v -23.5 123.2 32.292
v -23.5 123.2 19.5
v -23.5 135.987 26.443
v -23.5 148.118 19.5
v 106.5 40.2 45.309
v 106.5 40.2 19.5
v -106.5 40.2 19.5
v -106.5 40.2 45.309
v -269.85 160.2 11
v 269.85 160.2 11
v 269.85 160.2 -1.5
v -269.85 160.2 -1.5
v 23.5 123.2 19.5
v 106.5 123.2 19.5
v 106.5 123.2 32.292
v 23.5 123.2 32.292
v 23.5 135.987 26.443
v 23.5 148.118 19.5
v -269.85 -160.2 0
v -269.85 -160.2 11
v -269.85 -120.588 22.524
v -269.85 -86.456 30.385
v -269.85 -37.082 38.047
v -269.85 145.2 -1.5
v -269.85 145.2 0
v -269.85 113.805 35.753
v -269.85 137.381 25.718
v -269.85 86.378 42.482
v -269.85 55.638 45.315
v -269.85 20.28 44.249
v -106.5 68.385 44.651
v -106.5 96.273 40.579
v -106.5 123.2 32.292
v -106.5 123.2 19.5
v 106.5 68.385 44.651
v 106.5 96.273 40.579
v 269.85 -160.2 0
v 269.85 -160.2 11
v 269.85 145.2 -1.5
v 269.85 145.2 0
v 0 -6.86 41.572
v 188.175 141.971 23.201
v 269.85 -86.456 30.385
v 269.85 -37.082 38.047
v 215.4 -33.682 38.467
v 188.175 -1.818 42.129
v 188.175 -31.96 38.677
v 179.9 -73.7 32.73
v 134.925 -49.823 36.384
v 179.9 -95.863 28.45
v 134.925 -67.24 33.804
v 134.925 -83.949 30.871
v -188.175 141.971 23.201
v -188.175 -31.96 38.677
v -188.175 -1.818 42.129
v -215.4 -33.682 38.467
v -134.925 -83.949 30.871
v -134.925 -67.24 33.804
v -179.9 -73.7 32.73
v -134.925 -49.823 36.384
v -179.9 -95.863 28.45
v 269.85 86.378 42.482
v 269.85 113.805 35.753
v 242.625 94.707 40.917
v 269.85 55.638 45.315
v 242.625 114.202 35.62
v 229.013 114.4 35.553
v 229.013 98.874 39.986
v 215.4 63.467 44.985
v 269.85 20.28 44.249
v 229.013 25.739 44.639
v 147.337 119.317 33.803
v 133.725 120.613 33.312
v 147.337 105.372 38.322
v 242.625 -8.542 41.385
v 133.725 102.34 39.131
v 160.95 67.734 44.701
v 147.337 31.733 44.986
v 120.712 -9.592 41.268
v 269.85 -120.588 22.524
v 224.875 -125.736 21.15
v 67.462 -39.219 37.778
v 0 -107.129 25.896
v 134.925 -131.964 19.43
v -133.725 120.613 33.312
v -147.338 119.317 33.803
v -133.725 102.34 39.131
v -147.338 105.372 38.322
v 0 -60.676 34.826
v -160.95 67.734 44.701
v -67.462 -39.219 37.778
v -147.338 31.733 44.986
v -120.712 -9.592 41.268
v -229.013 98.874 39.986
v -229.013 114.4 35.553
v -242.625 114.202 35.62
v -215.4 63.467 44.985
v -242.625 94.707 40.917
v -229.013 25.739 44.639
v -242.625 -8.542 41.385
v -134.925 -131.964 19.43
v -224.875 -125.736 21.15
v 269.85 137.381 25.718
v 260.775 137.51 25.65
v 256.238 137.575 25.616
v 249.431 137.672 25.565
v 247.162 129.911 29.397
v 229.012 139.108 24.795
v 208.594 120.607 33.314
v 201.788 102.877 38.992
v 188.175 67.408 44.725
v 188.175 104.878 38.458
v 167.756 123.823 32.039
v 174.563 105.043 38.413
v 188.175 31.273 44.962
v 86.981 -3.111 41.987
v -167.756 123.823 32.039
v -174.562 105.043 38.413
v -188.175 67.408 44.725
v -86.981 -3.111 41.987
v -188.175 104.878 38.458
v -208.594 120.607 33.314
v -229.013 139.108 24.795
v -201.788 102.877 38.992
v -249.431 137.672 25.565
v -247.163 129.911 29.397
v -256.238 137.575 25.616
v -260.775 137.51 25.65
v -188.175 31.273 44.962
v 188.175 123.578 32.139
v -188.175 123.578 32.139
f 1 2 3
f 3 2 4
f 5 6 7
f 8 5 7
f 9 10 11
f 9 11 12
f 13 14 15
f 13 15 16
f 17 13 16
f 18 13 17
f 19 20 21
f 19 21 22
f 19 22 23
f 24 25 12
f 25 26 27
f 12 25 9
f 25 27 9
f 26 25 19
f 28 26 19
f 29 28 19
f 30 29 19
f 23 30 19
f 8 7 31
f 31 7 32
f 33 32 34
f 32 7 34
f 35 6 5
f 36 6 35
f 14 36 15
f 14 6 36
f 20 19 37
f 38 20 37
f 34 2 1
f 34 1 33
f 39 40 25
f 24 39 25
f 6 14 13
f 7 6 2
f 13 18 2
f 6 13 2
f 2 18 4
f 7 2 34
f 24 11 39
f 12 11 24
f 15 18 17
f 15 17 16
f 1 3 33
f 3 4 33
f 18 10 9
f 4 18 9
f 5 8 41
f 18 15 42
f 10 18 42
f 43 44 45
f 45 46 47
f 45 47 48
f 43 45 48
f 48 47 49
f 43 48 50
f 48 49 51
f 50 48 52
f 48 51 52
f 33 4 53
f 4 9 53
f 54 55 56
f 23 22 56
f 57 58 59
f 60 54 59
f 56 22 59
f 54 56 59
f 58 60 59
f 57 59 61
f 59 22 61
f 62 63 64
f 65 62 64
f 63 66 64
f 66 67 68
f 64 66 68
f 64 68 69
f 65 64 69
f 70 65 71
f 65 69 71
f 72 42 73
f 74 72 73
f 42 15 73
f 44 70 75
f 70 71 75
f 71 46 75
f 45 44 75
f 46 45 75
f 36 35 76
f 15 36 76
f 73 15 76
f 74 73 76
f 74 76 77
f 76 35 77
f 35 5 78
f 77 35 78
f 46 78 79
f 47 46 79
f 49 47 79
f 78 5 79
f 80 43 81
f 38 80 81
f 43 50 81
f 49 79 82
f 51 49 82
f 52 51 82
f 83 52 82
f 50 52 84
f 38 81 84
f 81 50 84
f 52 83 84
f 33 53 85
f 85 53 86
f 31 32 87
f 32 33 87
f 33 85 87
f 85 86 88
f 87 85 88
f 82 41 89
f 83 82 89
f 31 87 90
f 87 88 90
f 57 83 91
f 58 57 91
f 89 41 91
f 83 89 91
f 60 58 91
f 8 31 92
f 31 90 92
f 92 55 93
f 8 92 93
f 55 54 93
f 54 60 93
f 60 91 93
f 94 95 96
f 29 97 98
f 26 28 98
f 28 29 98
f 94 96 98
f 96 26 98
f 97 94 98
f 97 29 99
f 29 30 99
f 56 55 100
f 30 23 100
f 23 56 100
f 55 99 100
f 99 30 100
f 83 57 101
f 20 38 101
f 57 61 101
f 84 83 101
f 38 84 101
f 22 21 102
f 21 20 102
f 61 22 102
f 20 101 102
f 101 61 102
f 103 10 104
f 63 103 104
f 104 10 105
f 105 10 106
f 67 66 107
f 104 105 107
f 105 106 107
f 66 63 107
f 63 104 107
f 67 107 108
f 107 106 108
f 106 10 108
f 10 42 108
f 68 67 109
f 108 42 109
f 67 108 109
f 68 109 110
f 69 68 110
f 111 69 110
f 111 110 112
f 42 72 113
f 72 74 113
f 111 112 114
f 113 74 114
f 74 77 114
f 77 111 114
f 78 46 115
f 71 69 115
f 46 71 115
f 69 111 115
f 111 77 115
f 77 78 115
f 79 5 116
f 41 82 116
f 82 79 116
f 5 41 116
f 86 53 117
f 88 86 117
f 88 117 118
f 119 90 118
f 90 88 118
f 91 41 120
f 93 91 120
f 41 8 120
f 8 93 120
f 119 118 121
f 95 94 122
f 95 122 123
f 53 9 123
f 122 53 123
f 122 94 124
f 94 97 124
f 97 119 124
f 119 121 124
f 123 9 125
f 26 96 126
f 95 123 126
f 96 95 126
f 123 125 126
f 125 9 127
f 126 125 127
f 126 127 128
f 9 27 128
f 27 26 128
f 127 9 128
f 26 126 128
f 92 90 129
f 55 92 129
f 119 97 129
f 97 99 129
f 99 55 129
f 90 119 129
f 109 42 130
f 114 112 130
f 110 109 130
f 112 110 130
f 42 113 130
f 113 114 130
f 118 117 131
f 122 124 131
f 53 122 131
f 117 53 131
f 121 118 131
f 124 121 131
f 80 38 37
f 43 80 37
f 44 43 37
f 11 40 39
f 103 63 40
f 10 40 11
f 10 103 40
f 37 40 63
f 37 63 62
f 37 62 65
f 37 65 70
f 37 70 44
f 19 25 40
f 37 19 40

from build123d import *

# Parameters (mm, degrees)
SKETCH_1_W          = 539.7
SKETCH_1_H          = 320.4
EXTRUDE_1_DEPTH     = 11
EXTRUDE_2_DEPTH     = 539.7
SKETCH_4_W          = 213
SKETCH_4_H          = 83
SKETCH_4_W_2        = 47
SKETCH_4_H_2        = 37
CUT_EXTRUDE_1_DEPTH = 50
SKETCH_5_W          = 539.7
SKETCH_5_H          = 15
EXTRUDE_3_DEPTH     = 1.5


with BuildPart() as part:
    # 草圖1 → 填料-伸長1 (new body)
    with BuildSketch(Plane.XY):
        Rectangle(SKETCH_1_W, SKETCH_1_H)
    extrude(amount=EXTRUDE_1_DEPTH)

    # 草圖3 → 填料-伸長2 (add)
    with BuildSketch(Plane.ZY.offset(269.85)):
        with BuildLine():
            Line((11, 160.2), (11, -160.2))
            add(Edge.make_bspline(
                [(11, 160.2), (53.418678894, 105.581967835), (38.074193493, -46.19843894), (30.140931245, -99.160452943), (11, -160.2)],
                knots=[0, 0, 0, 0, 0.430834625, 1, 1, 1, 1], degree=3))
        make_face()
    extrude(amount=-EXTRUDE_2_DEPTH)

    # 草圖4 → 除料-伸長1 (cut)
    with BuildSketch(Plane(origin=(0, 0, 19.5), x_dir=(-1, 0, 0), z_dir=(0, 0, -1))):
        with Locations((0, 81.7)):
            Rectangle(SKETCH_4_W, SKETCH_4_H)
        with Locations((0, 141.7)):
            Rectangle(SKETCH_4_W_2, SKETCH_4_H_2)
    extrude(amount=-CUT_EXTRUDE_1_DEPTH, mode=Mode.SUBTRACT)

    # 草圖5 → 填料-伸長3 (add)
    with BuildSketch(Plane(origin=(0, 0, 0), x_dir=(-1, 0, 0), z_dir=(0, 0, -1))):
        with Locations((0, 152.7)):
            Rectangle(SKETCH_5_W, SKETCH_5_H)
    extrude(amount=EXTRUDE_3_DEPTH)


solid = part.part
